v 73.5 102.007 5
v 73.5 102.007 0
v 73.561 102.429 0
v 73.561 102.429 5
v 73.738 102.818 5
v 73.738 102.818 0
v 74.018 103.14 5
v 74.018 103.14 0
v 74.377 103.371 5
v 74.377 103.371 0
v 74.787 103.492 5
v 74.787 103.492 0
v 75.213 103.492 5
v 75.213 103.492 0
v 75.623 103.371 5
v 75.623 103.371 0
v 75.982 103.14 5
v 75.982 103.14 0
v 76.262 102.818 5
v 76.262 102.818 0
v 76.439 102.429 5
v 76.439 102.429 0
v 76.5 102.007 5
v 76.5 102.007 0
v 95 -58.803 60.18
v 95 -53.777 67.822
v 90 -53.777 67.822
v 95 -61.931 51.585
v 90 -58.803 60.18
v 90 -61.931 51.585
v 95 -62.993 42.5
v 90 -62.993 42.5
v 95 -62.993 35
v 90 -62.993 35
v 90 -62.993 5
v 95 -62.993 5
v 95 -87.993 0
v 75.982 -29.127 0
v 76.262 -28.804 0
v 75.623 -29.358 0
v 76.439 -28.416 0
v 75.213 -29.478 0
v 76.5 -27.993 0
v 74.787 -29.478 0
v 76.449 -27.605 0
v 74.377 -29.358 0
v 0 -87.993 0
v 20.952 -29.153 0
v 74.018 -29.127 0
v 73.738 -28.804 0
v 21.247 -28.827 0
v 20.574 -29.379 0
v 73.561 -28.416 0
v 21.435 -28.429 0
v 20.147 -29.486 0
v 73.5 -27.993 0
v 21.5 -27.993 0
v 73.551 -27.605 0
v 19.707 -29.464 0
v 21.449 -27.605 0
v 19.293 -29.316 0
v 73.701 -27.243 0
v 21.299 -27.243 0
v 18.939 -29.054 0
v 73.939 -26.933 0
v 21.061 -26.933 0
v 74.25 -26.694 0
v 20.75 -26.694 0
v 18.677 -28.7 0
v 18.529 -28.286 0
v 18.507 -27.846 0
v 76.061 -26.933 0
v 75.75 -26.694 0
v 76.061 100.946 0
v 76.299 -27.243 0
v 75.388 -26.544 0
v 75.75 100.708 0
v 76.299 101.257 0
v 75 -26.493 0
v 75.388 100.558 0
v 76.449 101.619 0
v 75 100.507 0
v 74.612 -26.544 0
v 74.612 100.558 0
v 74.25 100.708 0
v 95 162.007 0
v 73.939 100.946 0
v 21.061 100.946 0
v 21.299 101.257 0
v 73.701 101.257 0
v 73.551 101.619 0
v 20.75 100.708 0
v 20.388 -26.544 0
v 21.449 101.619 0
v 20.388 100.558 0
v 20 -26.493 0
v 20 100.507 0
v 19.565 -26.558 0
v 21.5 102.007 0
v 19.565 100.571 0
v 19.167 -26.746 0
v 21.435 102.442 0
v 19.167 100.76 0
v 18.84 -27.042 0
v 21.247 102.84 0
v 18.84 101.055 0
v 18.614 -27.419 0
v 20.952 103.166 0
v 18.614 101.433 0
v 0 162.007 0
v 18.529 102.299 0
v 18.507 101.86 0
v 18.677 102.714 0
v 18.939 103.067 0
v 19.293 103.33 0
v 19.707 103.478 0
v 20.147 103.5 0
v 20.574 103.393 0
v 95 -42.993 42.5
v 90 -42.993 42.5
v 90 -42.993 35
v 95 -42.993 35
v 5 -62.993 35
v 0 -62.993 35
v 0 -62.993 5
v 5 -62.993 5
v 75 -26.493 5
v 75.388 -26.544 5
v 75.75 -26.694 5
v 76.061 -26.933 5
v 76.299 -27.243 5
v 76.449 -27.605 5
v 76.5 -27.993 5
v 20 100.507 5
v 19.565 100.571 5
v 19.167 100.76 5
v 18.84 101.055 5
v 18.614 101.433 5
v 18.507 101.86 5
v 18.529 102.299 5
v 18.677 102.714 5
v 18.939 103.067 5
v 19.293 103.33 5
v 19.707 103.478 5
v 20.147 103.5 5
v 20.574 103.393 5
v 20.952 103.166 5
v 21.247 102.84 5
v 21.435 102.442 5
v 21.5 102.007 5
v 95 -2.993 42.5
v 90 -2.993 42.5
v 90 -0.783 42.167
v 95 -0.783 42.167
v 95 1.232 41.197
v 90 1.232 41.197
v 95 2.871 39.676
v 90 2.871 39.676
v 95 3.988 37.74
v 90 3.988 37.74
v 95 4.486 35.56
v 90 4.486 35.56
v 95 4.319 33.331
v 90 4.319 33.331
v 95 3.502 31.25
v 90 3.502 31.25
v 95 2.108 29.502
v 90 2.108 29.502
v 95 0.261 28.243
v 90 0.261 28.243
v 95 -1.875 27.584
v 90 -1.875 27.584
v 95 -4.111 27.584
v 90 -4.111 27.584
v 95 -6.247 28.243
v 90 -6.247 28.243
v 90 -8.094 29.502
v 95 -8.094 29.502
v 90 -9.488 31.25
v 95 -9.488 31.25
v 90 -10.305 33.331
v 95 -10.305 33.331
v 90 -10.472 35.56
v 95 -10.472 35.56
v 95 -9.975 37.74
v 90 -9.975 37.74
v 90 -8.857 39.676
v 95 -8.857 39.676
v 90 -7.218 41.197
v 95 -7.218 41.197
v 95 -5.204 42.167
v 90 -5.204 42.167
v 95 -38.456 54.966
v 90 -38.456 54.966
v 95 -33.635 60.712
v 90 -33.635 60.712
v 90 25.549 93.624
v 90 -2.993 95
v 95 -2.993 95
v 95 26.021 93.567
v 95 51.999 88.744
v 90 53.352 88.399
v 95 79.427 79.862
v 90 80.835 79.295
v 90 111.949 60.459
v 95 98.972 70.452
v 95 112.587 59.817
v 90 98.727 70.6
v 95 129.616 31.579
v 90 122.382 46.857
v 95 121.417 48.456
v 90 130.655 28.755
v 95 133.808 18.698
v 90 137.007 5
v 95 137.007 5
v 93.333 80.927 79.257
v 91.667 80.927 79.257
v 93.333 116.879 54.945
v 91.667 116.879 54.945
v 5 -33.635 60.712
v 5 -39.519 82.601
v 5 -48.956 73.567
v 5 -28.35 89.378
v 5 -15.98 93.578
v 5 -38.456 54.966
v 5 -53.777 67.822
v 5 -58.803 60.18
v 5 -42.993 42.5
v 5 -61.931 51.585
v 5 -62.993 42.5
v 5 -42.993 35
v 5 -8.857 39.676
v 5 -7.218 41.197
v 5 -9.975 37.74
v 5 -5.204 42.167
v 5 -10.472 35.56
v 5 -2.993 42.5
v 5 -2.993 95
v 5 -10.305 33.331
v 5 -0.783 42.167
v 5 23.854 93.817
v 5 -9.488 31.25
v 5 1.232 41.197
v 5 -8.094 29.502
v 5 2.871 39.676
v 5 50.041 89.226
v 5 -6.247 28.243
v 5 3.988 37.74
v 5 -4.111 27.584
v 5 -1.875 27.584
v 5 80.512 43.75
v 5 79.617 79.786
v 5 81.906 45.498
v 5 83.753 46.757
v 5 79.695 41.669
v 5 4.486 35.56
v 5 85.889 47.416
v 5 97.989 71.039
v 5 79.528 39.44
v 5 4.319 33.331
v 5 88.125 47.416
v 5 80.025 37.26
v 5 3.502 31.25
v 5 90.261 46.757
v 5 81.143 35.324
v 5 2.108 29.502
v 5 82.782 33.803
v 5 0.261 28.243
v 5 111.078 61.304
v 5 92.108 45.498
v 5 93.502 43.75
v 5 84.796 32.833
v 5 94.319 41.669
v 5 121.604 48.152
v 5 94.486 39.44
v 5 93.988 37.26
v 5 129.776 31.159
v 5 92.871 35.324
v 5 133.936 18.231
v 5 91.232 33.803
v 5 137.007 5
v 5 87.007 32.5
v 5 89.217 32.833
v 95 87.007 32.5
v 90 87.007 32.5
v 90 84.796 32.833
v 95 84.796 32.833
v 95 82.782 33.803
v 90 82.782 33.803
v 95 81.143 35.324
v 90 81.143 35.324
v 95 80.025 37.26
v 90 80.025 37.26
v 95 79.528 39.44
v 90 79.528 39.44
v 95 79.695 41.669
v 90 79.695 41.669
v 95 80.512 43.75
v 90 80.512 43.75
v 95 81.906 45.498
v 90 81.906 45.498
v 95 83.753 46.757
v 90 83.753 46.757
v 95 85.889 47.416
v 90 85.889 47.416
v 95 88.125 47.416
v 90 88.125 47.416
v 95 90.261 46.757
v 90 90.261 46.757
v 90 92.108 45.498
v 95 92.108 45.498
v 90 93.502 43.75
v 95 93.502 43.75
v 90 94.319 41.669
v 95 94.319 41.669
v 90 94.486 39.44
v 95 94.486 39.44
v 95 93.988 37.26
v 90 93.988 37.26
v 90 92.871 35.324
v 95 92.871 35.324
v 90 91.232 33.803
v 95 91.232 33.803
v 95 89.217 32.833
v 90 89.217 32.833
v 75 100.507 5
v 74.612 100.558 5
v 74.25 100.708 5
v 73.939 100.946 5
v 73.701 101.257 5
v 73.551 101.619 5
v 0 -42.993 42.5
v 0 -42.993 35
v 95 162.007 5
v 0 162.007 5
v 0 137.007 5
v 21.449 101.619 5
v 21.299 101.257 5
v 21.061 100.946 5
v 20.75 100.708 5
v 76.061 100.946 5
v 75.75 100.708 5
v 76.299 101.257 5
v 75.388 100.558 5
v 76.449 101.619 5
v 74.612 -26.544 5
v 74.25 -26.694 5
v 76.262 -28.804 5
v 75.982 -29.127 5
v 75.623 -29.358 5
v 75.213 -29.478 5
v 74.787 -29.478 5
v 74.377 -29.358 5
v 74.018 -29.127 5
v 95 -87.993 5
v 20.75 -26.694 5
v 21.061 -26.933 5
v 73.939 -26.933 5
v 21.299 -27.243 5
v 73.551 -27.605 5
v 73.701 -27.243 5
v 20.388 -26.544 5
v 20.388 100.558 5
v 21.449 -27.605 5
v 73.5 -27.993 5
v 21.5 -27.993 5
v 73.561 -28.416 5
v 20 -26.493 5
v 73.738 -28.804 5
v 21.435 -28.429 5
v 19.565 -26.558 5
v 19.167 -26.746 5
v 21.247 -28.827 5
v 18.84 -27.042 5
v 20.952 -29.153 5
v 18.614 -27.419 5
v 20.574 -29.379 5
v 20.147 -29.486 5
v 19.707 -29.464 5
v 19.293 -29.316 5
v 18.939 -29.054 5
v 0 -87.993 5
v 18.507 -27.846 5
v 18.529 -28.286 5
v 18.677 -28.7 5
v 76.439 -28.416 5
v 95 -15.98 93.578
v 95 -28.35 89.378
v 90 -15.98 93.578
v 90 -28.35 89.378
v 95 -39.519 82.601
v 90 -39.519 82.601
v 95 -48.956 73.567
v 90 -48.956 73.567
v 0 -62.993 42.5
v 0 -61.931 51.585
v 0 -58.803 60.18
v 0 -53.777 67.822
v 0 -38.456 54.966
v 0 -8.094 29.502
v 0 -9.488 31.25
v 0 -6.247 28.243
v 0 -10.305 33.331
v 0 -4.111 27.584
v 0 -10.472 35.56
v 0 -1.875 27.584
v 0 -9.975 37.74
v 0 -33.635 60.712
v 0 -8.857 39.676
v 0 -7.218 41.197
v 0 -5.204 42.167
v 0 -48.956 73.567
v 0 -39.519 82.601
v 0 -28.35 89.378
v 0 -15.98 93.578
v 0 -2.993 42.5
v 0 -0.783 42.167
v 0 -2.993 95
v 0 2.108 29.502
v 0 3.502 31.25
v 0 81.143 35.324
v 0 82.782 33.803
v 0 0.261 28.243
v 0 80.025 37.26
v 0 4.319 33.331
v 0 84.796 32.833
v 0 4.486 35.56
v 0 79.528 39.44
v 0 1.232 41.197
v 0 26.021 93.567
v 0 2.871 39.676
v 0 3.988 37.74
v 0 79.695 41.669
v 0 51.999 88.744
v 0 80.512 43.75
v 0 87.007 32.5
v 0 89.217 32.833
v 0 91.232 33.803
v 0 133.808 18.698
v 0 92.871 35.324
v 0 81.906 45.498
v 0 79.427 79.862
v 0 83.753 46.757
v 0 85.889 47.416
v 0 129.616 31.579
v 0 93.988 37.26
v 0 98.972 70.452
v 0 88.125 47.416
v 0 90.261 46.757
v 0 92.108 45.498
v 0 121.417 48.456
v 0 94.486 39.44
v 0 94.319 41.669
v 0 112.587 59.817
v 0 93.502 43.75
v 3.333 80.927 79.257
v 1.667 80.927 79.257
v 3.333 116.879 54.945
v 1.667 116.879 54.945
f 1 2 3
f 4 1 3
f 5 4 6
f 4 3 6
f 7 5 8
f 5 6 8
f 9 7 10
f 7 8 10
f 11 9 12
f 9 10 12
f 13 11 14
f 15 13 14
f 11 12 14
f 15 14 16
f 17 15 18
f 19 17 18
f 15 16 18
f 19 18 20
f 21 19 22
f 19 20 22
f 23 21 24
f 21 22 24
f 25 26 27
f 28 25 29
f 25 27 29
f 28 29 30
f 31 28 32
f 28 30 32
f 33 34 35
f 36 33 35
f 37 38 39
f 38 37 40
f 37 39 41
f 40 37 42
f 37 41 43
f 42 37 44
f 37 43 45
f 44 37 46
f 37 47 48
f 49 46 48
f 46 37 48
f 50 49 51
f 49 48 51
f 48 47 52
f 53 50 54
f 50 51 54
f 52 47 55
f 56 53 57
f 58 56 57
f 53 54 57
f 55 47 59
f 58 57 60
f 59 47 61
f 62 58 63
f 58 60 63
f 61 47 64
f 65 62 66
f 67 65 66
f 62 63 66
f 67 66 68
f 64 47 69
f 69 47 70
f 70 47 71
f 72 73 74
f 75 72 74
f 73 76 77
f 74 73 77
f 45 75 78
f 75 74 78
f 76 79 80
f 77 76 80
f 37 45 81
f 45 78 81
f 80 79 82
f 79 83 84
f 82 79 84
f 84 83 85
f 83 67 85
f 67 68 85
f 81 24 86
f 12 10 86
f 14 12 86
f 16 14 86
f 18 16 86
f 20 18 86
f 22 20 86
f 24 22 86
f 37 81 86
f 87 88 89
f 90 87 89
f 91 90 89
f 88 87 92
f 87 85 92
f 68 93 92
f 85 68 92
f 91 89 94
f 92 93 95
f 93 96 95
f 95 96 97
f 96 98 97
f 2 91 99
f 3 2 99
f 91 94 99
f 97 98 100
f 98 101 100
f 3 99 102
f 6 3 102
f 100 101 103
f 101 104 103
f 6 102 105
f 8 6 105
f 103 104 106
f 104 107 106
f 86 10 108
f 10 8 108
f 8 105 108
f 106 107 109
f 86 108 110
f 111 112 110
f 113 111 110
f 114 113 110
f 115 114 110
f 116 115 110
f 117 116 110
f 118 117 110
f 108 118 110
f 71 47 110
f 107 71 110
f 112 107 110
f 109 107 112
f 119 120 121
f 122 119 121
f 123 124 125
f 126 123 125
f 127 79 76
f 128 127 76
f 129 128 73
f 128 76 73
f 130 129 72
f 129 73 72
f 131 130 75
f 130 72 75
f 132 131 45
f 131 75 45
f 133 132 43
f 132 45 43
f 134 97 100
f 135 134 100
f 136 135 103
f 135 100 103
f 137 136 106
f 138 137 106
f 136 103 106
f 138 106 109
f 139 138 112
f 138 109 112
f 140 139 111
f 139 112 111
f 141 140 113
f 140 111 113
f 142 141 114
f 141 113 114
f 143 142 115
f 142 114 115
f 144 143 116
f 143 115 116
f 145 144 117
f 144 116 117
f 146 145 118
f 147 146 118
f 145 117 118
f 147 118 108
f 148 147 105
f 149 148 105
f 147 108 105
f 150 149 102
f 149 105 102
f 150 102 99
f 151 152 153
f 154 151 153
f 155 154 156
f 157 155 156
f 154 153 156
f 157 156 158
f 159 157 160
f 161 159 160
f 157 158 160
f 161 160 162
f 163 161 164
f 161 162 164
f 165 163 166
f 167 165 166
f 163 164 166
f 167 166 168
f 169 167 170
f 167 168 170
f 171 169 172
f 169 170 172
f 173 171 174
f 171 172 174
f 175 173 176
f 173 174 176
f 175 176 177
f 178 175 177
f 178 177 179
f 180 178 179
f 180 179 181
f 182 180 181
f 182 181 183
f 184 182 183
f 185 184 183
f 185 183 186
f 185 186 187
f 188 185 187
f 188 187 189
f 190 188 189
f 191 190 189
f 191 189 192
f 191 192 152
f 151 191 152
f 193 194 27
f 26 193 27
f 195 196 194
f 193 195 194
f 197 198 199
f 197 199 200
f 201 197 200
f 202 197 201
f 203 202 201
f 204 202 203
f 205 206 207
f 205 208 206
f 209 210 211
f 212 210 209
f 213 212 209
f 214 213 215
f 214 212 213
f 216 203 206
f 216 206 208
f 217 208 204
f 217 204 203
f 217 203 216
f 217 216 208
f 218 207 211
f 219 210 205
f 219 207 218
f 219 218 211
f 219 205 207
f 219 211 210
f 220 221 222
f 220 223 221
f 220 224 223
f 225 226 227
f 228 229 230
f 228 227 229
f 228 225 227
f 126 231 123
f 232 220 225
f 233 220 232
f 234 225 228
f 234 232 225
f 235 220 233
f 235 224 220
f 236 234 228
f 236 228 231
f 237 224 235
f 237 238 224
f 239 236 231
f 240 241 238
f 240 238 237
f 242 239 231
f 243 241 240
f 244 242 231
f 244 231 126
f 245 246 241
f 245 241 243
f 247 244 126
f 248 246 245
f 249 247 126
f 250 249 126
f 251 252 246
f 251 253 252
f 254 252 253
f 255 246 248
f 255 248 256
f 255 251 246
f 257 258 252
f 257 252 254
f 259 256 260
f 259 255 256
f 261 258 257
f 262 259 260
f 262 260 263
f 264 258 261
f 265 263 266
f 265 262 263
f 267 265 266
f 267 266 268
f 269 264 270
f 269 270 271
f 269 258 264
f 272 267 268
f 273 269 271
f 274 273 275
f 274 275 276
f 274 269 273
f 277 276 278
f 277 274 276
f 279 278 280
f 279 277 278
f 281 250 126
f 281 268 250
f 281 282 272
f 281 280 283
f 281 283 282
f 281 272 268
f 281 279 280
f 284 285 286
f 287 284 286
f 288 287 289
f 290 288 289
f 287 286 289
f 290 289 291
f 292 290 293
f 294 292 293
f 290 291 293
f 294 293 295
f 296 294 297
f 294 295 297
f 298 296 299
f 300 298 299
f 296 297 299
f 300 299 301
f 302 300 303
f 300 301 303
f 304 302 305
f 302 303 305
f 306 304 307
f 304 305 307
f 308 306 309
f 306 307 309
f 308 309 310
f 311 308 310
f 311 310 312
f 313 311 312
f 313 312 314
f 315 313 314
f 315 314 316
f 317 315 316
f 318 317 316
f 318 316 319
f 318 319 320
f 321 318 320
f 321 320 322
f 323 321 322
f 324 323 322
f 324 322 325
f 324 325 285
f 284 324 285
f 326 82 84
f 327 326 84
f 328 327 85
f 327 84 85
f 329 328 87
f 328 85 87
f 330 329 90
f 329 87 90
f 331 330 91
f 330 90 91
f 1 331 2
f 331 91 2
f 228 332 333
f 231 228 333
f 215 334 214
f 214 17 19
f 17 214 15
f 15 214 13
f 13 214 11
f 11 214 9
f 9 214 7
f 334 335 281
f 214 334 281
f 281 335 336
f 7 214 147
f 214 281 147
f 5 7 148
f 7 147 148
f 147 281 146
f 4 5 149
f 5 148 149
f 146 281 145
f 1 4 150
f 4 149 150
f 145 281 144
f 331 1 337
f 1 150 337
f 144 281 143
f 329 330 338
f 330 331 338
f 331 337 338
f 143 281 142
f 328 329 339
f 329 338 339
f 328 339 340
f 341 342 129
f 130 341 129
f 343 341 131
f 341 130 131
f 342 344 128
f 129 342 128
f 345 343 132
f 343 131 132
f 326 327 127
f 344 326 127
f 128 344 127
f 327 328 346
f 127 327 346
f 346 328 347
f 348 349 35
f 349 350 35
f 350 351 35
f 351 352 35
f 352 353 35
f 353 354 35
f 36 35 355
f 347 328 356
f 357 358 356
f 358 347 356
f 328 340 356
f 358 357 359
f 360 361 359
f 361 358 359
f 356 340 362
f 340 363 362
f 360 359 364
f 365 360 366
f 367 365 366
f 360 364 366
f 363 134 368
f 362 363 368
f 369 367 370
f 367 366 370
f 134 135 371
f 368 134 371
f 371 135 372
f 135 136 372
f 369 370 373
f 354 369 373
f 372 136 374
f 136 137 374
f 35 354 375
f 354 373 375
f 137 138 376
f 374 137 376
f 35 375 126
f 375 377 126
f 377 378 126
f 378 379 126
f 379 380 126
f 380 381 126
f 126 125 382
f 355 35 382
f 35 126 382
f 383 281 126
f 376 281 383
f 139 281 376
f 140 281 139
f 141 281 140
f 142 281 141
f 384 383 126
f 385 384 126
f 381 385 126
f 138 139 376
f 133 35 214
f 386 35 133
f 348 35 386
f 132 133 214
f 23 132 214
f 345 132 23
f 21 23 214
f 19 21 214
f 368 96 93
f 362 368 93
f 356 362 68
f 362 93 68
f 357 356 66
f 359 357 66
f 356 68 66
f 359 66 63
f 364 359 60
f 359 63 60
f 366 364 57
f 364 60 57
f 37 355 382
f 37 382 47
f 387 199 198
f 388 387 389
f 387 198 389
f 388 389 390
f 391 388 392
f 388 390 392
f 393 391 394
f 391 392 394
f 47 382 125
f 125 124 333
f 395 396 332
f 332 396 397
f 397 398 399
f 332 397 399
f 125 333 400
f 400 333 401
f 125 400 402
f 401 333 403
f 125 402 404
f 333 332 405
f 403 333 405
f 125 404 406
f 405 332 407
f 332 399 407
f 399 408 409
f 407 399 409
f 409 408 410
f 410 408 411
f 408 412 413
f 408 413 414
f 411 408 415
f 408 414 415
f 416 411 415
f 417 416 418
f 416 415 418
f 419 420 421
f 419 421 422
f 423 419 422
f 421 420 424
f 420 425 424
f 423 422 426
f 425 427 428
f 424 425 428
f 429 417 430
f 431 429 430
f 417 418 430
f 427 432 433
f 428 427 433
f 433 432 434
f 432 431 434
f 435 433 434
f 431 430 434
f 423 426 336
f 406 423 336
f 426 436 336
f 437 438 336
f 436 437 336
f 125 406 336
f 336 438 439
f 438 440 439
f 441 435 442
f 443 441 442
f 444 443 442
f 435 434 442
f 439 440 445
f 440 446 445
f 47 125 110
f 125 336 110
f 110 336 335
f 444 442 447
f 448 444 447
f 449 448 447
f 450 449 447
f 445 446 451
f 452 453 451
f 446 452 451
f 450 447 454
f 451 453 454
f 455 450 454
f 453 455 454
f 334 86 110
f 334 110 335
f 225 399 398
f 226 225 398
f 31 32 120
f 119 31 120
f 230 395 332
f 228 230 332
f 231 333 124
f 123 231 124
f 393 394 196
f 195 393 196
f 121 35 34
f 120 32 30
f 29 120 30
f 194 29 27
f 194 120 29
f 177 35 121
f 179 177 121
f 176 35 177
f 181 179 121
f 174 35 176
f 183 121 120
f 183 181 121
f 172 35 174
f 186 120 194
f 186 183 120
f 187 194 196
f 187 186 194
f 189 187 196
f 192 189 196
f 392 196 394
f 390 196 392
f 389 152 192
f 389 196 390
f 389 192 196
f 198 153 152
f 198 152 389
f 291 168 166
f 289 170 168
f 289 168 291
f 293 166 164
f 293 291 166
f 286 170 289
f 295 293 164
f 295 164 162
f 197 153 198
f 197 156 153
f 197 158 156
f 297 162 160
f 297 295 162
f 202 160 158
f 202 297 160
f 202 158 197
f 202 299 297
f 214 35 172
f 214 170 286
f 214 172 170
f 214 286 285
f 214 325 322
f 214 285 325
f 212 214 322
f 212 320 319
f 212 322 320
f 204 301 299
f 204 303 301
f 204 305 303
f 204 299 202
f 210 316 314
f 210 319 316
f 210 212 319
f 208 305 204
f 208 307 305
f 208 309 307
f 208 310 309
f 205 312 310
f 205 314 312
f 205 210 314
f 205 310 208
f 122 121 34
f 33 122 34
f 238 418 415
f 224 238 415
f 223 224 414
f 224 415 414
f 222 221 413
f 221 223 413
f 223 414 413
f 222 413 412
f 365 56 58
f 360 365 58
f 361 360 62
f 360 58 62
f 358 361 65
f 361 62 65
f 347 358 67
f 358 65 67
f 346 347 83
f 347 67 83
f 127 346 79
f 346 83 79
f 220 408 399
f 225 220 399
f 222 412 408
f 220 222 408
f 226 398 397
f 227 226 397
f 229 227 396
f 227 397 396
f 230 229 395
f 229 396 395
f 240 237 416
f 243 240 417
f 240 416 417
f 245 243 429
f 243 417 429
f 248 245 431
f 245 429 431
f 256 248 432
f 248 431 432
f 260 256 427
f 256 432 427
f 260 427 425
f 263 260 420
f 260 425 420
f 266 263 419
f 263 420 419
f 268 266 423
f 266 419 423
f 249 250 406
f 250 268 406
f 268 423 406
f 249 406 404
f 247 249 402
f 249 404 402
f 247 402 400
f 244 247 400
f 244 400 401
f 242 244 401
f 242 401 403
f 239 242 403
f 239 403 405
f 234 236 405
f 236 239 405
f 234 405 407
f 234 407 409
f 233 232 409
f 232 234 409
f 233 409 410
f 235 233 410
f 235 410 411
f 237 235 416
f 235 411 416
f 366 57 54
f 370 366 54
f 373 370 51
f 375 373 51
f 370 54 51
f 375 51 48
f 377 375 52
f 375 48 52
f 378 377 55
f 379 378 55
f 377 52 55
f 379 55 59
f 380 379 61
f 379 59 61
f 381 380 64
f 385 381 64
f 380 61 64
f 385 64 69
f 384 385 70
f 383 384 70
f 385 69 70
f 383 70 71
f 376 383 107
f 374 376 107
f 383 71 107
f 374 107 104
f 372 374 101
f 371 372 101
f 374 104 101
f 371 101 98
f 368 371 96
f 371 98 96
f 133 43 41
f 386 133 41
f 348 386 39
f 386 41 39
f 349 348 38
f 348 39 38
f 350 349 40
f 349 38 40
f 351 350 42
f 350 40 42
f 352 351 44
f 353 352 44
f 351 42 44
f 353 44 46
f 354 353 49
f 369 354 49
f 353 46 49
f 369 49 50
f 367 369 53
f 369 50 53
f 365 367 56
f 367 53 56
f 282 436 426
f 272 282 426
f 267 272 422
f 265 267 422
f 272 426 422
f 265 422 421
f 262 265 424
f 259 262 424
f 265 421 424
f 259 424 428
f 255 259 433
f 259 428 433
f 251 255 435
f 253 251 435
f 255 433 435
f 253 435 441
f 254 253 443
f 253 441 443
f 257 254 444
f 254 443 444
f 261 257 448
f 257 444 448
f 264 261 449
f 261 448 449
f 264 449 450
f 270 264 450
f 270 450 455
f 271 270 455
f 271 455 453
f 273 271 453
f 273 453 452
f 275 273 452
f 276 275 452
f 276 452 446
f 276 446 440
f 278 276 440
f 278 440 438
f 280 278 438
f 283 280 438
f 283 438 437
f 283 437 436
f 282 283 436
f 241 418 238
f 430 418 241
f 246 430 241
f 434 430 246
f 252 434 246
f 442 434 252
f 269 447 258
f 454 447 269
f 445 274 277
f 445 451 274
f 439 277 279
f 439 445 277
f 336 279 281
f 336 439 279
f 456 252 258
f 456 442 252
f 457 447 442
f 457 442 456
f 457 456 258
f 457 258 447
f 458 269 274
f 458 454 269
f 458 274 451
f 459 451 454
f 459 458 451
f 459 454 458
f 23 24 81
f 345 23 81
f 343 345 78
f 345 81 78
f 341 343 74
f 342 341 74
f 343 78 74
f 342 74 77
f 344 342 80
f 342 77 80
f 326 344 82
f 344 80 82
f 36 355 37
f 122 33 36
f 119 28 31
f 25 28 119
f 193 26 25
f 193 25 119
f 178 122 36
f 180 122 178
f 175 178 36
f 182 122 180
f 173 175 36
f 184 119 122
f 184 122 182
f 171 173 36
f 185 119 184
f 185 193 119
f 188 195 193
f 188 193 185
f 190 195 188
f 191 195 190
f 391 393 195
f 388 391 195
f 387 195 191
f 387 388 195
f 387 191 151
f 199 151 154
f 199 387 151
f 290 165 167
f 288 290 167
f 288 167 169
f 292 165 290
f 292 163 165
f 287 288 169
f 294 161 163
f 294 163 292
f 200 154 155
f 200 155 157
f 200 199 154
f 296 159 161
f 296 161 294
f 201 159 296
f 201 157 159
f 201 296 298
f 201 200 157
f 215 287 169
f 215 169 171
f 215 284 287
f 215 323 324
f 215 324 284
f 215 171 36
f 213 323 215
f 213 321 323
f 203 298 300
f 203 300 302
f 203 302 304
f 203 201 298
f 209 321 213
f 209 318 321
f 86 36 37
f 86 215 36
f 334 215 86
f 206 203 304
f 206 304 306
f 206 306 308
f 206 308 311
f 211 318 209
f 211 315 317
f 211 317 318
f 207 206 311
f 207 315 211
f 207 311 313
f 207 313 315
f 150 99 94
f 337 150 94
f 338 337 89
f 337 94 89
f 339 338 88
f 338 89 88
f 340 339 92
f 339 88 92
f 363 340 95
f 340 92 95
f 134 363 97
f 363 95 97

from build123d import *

# Parameters (mm, degrees)
F1_DEPTH      = 95
F3_DEPTH      = 150
F3_DEPTH_BACK = 150
F5_DEPTH      = 25


with BuildPart() as f1:
    # F0 (on Right) → F1 (new body)
    with BuildSketch(Plane.YZ):
        Polygon((-87.993201702, 5), (-87.993201702, 0), (162.006798298, 0), (162.006798298, 5), (137.006798298, 5), (87.006798298, 5), (-2.993201702, 5), (-62.993201702, 5), align=None)
        with BuildLine():
            Line((-62.993201702, 35), (-62.993201702, 5))
            Line((-62.993201702, 5), (-2.993201702, 5))
            Line((-2.993201702, 5), (-2.993201702, 27.5))
            ThreePointArc((-2.993201702, 27.5), (-10.493201702, 35), (-2.993201702, 42.5))
            Line((-2.993201702, 42.5), (-2.993201702, 95))
            ThreePointArc((-2.993201702, 95), (-28.3502974065, 89.3784672222), (-48.9558682892, 73.5672565812))
            Line((-48.9558682892, 73.5672565812), (-33.6349794268, 60.7115043875))
            Line((-33.6349794268, 60.7115043875), (-38.4558864994, 54.9661710641))
            Line((-38.4558864994, 54.9661710641), (-53.7767753618, 67.8219232578))
            ThreePointArc((-53.7767753618, 67.8219232578), (-60.6174576688, 55.9735139436), (-62.993201702, 42.5))
            Line((-62.993201702, 42.5), (-42.993201702, 42.5))
            Line((-42.993201702, 42.5), (-42.993201702, 35))
            Line((-42.993201702, 35), (-62.993201702, 35))
        make_face()
        with BuildLine():
            Line((87.006798298, 5), (137.006798298, 5))
            add(Edge.make_bspline(
                [(-2.993201702, 95), (30.6227877736, 95.7361534238), (79.8862645285, 82.5462463817), (121.0056993256, 58.60780489), (133.2323859183, 24.3846146975), (137.006798298, 5)],
                knots=[0, 0, 0, 0, 0.3988693097, 0.6832428088, 1, 1, 1, 1], degree=3))
            Line((-2.993201702, 95), (-2.993201702, 42.5))
            ThreePointArc((-2.993201702, 42.5), (2.3100991569, 40.3033008589), (4.506798298, 35))
            ThreePointArc((4.506798298, 35), (2.3100991569, 29.6966991411), (-2.993201702, 27.5))
            Line((-2.993201702, 27.5), (-2.993201702, 5))
            Line((-2.993201702, 5), (87.006798298, 5))
        make_face()
        with BuildLine():
            ThreePointArc((94.506798298, 40), (92.3100991569, 34.6966991411), (87.006798298, 32.5))
            ThreePointArc((87.006798298, 32.5), (81.7034974391, 45.3033008589), (94.506798298, 40))
        make_face(mode=Mode.SUBTRACT)
    extrude(amount=F1_DEPTH)

    # F2 (on Front) → F3 (cut, two sides)
    with BuildSketch(Plane.XZ) as f3_sk:
        Polygon((5, 5), (90, 5), (90, 95), (90, 99.046766758), (5, 99.046766758), (5, 95), align=None)
    extrude(amount=-F3_DEPTH, mode=Mode.SUBTRACT)
    extrude(f3_sk.sketch, amount=F3_DEPTH_BACK, mode=Mode.SUBTRACT)

    # F4 (on face) → F5 (cut)
    with BuildSketch(Plane(origin=(0, 0, 0), x_dir=(1, 0, 0), z_dir=(0, 0, -1))):
        with BuildLine():
            Line((20, 26.493201702), (20, 27.993201702))
            Line((20, 27.993201702), (21.5, 27.993201702))
            ThreePointArc((21.5, 27.993201702), (18.9393398282, 29.0538618738), (20, 26.493201702))
        make_face()
        with BuildLine():
            Line((21.5, 27.993201702), (20, 27.993201702))
            Line((20, 27.993201702), (20, 26.493201702))
            ThreePointArc((20, 26.493201702), (21.0606601718, 26.9325415303), (21.5, 27.993201702))
        make_face()
        with BuildLine():
            Line((75, 27.993201702), (73.5, 27.993201702))
            ThreePointArc((73.5, 27.993201702), (73.9393398282, 26.9325415303), (75, 26.493201702))
            Line((75, 26.493201702), (75, 27.993201702))
        make_face()
        with BuildLine():
            ThreePointArc((76.5, 27.993201702), (75, 29.493201702), (73.5, 27.993201702))
            Line((73.5, 27.993201702), (75, 27.993201702))
            Line((75, 27.993201702), (75, 26.493201702))
            ThreePointArc((75, 26.493201702), (76.0606601718, 26.9325415303), (76.5, 27.993201702))
        make_face()
        with BuildLine():
            ThreePointArc((21.5, -102.006798298), (21.0606601718, -100.9461381262), (20, -100.506798298))
            Line((20, -100.506798298), (20, -102.006798298))
            Line((20, -102.006798298), (21.5, -102.006798298))
        make_face()
        with BuildLine():
            Line((20, -102.006798298), (20, -100.506798298))
            ThreePointArc((20, -100.506798298), (18.9393398282, -103.0674584697), (21.5, -102.006798298))
            Line((21.5, -102.006798298), (20, -102.006798298))
        make_face()
        with BuildLine():
            Line((75, -102.006798298), (75, -100.506798298))
            ThreePointArc((75, -100.506798298), (73.9393398282, -100.9461381262), (73.5, -102.006798298))
            Line((73.5, -102.006798298), (75, -102.006798298))
        make_face()
        with BuildLine():
            ThreePointArc((76.5, -102.006798298), (76.0606601718, -100.9461381262), (75, -100.506798298))
            Line((75, -100.506798298), (75, -102.006798298))
            Line((75, -102.006798298), (73.5, -102.006798298))
            ThreePointArc((73.5, -102.006798298), (75, -103.506798298), (76.5, -102.006798298))
        make_face()
    extrude(amount=-F5_DEPTH, mode=Mode.SUBTRACT)


solid = f1.part
